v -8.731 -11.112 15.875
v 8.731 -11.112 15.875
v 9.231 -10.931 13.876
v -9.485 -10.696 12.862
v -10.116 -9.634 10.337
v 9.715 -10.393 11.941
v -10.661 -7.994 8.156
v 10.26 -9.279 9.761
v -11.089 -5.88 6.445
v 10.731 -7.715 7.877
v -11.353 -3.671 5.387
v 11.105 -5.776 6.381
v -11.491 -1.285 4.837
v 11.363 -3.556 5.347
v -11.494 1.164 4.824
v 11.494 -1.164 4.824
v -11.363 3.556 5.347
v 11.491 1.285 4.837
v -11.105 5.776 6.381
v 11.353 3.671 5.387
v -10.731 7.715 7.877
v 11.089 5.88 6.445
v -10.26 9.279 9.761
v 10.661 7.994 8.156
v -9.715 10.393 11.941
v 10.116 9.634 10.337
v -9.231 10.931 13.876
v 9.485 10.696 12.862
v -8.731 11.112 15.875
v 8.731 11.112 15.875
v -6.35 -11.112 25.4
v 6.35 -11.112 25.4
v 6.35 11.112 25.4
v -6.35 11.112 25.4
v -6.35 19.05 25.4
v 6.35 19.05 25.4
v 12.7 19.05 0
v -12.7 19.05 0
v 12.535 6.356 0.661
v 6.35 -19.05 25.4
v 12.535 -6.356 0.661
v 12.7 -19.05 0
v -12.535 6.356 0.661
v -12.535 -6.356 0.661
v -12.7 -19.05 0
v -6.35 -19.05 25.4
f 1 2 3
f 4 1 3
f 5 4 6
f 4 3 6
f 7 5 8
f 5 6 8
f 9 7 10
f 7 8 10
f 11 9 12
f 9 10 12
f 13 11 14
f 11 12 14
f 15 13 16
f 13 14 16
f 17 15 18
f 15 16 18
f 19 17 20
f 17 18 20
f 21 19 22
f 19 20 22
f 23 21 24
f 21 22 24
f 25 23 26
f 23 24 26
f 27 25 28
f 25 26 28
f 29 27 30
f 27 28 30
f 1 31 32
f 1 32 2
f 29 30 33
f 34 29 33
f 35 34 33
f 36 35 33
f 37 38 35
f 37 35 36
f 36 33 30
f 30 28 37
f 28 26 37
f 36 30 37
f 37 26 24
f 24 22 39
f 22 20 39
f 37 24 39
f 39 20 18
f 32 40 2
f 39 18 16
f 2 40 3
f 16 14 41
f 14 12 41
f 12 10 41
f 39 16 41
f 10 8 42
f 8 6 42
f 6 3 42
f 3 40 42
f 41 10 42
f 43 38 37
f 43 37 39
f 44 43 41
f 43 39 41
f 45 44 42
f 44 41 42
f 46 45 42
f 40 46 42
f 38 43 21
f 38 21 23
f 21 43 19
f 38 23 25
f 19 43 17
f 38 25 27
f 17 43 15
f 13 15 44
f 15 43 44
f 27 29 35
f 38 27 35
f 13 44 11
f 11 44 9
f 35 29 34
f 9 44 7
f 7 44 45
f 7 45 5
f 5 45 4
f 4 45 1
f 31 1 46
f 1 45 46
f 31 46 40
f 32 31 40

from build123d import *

# Parameters (mm, degrees)
F1_DEPTH  = 19.05
F1_FACE_W = 25.4
F1_FACE_H = 25.4
F2_DEPTH  = 19.05
F4_DEPTH  = 25.4
F6_DEPTH  = 25.4
F8_DEPTH  = 38.1


with BuildPart() as f1:
    # F0 (on Front) → F1 (new body)
    with BuildSketch(Plane.XZ):
        Polygon((-12.7, 0), (0, 0), (12.7, 0), (12.7, 25.4), (-12.7, 25.4), align=None)
    extrude(amount=F1_DEPTH)

    # F1_face (on face) → F2 (join)
    with BuildSketch(Plane(origin=(0, 0, 12.7), x_dir=(1, 0, 0), z_dir=(0, 1, 0))):
        Rectangle(F1_FACE_W, F1_FACE_H)
    extrude(amount=F2_DEPTH)

    # F3 (on face) → F4 (cut)
    with BuildSketch(Plane.YZ.offset(12.7)):
        with BuildLine():
            Line((-19.05, 0), (19.05, 0))
            ThreePointArc((19.05, 0), (0, 0.743338), (-19.05, 0))
        make_face()
    extrude(amount=-F4_DEPTH, mode=Mode.SUBTRACT)

    # F5 (on face) → F6 (cut)
    with BuildSketch(Plane.YZ.offset(12.7)):
        with BuildLine():
            Line((-11.1125, 25.4), (-11.1125, 15.875))
            ThreePointArc((-11.1125, 15.875), (0, 4.7625), (11.1125, 15.875))
            Line((11.1125, 15.875), (11.1125, 25.4))
            Line((11.1125, 25.4), (-11.1125, 25.4))
        make_face()
    extrude(amount=-F6_DEPTH, mode=Mode.SUBTRACT)

    # F7 (on face) → F8 (cut)
    with BuildSketch(Plane.XZ.offset(19.05)):
        Polygon((-12.7, 25.4), (-12.7, 0), (-6.35, 25.4), align=None)
        Polygon((6.35, 25.4), (12.7, 0), (12.7, 25.4), align=None)
    extrude(amount=-F8_DEPTH, mode=Mode.SUBTRACT)


solid = f1.part
